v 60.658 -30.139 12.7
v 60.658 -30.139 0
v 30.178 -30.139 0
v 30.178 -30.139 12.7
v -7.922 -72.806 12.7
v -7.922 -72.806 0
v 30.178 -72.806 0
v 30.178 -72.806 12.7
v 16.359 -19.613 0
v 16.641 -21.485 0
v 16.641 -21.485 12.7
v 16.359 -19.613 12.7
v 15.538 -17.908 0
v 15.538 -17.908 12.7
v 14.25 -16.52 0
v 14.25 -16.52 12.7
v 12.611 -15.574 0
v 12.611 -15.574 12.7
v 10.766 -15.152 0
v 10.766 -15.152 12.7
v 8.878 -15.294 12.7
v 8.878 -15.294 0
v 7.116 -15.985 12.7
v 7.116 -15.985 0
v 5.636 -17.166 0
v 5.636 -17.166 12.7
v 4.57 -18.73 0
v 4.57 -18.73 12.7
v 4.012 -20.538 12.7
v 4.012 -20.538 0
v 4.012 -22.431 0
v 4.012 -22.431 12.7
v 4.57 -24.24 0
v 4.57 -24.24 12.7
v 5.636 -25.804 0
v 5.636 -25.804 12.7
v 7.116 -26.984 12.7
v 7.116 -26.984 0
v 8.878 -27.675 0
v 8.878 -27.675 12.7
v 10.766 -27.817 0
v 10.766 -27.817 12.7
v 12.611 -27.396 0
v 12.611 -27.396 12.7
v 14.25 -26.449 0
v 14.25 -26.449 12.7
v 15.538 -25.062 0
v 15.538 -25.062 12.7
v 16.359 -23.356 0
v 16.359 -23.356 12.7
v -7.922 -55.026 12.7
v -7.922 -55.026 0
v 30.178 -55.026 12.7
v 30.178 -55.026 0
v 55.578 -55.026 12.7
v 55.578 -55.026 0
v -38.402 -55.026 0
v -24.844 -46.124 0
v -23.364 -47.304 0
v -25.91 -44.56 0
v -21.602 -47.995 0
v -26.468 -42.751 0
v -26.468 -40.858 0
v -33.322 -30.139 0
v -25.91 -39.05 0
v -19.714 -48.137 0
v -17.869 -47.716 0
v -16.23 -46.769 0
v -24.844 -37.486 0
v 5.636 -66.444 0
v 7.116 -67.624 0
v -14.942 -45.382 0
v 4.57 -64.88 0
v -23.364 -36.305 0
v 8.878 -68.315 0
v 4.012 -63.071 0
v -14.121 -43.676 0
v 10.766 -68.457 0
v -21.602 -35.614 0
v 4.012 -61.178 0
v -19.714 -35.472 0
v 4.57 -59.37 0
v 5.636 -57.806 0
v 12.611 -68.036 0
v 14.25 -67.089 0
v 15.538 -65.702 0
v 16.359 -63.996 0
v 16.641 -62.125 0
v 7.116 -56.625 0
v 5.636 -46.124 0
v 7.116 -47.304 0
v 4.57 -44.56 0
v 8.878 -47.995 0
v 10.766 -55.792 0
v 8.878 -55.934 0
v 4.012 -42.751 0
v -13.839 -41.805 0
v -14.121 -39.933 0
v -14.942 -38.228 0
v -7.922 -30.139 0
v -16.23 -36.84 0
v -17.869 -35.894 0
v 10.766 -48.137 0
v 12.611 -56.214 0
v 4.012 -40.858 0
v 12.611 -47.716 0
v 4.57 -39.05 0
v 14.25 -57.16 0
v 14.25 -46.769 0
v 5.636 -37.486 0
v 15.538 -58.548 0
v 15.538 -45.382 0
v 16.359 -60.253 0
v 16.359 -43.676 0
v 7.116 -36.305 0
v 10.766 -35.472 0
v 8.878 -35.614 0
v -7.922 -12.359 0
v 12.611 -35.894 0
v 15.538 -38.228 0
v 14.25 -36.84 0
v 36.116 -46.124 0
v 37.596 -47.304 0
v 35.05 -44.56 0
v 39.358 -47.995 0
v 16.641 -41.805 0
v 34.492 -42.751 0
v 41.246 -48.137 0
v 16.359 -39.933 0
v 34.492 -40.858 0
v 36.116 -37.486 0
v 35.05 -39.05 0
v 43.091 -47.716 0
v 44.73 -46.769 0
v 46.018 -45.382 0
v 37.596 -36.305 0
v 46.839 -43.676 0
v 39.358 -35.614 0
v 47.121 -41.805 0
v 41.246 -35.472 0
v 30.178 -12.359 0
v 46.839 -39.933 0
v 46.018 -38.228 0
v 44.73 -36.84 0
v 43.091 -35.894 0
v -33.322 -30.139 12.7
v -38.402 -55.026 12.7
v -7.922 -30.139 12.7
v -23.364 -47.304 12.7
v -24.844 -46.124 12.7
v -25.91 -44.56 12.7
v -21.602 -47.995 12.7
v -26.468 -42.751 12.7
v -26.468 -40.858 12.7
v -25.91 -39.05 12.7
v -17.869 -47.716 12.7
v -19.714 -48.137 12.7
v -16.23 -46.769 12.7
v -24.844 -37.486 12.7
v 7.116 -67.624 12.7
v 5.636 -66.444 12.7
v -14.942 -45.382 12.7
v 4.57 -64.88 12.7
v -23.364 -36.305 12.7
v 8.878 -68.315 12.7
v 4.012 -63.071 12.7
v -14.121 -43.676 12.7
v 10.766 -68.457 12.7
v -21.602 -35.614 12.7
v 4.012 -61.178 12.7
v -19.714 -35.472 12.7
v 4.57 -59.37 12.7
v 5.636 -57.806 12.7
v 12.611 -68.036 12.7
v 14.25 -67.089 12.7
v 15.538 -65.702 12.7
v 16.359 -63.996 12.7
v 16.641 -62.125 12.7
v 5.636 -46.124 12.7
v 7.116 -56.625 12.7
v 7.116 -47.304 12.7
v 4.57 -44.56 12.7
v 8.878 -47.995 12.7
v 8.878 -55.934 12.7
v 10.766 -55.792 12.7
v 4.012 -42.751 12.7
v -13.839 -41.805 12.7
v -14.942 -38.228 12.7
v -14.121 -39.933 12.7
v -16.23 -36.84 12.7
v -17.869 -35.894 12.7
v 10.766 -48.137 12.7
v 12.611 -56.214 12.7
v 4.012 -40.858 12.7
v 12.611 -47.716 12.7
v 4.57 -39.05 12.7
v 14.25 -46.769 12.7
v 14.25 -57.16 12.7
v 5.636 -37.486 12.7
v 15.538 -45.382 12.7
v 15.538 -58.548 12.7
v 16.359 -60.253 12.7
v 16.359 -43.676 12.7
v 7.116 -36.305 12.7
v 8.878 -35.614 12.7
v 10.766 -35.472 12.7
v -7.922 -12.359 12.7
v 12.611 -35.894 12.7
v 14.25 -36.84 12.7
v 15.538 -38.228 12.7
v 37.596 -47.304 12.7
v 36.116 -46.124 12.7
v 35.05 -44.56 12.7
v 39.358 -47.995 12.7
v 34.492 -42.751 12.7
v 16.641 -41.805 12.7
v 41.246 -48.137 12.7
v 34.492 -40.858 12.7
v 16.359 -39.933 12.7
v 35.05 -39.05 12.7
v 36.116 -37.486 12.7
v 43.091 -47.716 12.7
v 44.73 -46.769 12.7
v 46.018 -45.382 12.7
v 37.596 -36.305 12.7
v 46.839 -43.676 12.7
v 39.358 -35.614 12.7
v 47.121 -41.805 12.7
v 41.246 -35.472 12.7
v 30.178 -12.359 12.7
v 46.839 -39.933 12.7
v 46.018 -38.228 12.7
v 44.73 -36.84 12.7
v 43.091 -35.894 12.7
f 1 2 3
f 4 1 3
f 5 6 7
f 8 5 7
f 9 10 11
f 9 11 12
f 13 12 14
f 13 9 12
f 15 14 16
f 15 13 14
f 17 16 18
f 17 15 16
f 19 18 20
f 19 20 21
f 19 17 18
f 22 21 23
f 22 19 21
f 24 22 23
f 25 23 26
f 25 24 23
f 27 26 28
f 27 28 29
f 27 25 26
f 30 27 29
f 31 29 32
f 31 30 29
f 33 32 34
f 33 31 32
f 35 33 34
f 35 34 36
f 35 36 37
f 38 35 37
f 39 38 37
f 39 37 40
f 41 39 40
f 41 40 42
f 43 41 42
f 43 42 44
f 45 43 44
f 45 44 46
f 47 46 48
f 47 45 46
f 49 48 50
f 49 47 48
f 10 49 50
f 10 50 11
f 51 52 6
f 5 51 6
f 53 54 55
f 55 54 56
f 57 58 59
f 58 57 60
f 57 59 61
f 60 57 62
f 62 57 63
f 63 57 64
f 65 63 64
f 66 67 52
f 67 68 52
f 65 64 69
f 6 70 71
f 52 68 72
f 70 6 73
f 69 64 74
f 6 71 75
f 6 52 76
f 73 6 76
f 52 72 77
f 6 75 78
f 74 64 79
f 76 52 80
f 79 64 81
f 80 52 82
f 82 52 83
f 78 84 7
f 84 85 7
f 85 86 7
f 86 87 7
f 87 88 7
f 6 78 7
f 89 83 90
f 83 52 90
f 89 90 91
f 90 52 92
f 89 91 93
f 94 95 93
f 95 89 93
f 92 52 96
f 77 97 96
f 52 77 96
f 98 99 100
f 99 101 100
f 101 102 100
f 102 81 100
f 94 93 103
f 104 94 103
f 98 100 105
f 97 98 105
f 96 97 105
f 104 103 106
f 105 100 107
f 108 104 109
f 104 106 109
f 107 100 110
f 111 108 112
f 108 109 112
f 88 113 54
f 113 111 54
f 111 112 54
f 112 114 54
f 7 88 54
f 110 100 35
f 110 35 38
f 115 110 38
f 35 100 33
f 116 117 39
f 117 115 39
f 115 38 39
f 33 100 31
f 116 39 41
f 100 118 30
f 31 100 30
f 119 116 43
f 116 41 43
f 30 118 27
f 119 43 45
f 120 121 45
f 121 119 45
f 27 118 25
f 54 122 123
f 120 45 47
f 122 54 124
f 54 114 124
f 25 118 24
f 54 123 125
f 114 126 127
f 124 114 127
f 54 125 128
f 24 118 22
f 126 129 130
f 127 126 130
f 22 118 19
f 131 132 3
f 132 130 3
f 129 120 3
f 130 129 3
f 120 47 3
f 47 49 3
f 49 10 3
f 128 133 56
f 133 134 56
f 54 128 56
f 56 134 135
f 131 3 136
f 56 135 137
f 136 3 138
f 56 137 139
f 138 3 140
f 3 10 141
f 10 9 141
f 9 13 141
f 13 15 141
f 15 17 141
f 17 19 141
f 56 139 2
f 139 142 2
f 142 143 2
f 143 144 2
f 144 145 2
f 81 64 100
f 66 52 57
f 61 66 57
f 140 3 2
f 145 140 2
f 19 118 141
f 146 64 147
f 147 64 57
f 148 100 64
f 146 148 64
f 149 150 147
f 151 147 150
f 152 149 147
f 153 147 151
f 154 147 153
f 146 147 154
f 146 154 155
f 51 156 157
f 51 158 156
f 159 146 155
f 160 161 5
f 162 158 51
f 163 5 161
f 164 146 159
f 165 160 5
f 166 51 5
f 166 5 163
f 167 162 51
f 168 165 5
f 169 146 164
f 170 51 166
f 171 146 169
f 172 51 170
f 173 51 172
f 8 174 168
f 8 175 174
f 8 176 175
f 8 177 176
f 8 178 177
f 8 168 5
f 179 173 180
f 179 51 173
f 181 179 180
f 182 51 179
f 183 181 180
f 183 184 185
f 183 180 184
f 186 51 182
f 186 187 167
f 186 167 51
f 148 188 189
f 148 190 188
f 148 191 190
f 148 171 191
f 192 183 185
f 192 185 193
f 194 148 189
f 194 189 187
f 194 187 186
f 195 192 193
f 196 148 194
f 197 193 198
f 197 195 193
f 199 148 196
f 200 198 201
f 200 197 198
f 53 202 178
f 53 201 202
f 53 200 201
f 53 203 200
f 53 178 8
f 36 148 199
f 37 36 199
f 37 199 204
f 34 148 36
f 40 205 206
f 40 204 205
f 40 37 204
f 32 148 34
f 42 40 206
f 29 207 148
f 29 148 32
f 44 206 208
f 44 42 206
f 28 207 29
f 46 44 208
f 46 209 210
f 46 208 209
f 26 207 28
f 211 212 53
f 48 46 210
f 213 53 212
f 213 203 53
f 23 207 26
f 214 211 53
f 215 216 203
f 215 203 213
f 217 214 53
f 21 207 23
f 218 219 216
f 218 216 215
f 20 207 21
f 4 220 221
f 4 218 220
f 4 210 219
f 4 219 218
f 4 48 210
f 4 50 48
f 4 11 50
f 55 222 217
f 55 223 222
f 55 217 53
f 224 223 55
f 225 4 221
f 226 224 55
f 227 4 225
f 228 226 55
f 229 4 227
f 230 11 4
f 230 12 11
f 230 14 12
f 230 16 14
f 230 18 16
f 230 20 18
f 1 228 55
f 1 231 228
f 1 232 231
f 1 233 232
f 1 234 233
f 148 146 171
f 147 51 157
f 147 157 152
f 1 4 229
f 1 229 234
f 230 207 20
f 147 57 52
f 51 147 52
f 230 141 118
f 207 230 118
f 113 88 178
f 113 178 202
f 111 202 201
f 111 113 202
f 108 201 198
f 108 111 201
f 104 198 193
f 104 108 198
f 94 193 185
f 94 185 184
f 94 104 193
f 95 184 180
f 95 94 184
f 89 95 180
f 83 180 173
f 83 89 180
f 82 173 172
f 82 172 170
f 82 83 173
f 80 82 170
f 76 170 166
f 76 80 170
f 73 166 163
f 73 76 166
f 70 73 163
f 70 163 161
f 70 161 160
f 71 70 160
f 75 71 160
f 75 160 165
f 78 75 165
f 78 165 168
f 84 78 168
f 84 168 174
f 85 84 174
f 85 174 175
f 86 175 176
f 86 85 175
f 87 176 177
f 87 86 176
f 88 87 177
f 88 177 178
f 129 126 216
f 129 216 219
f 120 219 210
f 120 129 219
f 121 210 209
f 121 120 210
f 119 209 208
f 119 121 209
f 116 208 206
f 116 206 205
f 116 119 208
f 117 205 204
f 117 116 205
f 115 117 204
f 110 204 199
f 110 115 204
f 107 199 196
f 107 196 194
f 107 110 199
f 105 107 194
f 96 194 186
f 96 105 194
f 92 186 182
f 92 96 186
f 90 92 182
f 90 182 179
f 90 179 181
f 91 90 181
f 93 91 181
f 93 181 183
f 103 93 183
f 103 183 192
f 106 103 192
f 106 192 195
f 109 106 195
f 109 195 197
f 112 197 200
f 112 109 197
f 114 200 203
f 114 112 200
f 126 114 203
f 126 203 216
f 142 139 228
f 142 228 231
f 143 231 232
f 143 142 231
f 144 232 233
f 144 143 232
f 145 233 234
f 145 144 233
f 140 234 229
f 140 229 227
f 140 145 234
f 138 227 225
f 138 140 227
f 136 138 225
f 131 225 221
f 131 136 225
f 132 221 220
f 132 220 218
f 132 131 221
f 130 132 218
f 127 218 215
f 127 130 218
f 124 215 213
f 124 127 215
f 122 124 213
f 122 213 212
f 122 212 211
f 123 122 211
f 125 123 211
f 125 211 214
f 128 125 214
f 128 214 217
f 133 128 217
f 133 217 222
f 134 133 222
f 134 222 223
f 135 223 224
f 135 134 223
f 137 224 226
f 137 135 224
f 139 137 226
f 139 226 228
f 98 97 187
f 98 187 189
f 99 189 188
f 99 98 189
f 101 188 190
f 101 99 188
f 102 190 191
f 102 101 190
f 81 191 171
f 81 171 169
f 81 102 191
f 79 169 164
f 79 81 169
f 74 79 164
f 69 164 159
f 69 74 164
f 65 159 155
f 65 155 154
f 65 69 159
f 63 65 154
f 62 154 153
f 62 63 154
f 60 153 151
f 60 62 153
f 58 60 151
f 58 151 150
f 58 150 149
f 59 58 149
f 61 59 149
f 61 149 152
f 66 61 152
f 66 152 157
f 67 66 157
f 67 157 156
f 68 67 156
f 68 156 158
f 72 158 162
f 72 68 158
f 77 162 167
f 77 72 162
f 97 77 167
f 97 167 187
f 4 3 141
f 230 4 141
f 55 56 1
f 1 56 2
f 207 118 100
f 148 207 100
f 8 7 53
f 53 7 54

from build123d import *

# Parameters (mm, degrees)
F0_R     = 6.35
F1_DEPTH = 12.7


with BuildPart() as f1:
    # F0 (on Top) → F1 (new body)
    with BuildSketch(Plane.XY):
        Polygon((-7.92159, -12.359408), (-7.92159, -30.139408), (-33.32159, -30.139408), (-38.40159, -55.026224), (-7.92159, -55.026224), (-7.92159, -72.806224), (30.17841, -72.806224), (30.17841, -55.026224), (55.57841, -55.026224), (60.65841, -30.139408), (30.17841, -30.139408), (30.17841, -12.359408), align=None)
        with Locations((10.291242, -62.124663)):
            Circle(F0_R, mode=Mode.SUBTRACT)
        with Locations((-20.188758, -41.804663)):
            Circle(F0_R, mode=Mode.SUBTRACT)
        with Locations((10.291242, -41.804663)):
            Circle(F0_R, mode=Mode.SUBTRACT)
        with Locations((10.291242, -21.484663)):
            Circle(F0_R, mode=Mode.SUBTRACT)
        with Locations((40.771242, -41.804663)):
            Circle(F0_R, mode=Mode.SUBTRACT)
    extrude(amount=F1_DEPTH)


solid = f1.part
